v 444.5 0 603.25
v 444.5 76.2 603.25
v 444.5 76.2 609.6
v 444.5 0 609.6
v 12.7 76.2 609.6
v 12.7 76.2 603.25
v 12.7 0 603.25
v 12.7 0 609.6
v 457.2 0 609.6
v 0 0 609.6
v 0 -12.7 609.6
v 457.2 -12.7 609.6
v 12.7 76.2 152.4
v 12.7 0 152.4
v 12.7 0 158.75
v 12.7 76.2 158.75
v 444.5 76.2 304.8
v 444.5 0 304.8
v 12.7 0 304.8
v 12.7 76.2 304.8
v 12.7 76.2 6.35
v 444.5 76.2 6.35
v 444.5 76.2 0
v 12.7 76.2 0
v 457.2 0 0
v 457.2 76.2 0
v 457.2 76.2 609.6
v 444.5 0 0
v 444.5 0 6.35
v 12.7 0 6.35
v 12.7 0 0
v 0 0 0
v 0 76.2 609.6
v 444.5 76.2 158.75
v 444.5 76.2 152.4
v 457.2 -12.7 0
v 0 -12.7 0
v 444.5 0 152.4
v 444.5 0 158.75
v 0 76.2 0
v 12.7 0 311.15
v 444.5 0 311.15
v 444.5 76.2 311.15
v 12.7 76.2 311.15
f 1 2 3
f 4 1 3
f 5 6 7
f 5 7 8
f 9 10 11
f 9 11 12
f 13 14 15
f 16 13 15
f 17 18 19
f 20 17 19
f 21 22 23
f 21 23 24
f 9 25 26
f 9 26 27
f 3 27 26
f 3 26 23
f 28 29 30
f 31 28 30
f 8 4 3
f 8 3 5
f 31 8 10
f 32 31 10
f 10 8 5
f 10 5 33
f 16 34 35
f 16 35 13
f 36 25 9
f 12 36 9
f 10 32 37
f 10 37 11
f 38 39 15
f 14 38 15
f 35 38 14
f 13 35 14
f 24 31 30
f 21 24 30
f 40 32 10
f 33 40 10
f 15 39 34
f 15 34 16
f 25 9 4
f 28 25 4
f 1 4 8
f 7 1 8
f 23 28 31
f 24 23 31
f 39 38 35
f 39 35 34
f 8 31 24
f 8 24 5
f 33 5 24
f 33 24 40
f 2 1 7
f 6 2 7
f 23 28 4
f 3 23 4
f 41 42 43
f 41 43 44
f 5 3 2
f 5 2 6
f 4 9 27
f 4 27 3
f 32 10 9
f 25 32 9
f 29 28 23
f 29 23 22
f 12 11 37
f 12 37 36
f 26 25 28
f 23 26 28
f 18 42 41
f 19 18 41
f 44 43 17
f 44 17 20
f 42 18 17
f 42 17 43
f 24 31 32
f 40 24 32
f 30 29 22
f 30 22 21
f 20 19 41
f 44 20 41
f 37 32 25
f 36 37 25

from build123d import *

# Parameters (mm, degrees)
F0_W     = 457.2
F0_H     = 609.6
F1_DEPTH = 12.7
F2_W     = 12.7
F2_H     = 609.6
F3_DEPTH = 76.2
F4_W     = 431.8
F4_H     = 6.35
F5_DEPTH = 76.2


with BuildPart() as f1:
    # F0 (on Front) → F1 (new body)
    with BuildSketch(Plane.XZ):
        with Locations((228.6, 304.8)):
            Rectangle(F0_W, F0_H)
    extrude(amount=F1_DEPTH)


with BuildPart() as f3:
    # F2 (on face) → F3 (new body)
    with BuildSketch(Plane(origin=(0, 0, 0), x_dir=(-1, 0, 0), z_dir=(0, 1, 0))):
        with Locations((-6.35, 304.8)):
            Rectangle(F2_W, F2_H)
        with Locations((-450.85, 304.8)):
            Rectangle(F2_W, F2_H)
    extrude(amount=F3_DEPTH)


with BuildPart() as f5:
    # F4 (on face) → F5 (new body)
    with BuildSketch(Plane(origin=(0, 0, 0), x_dir=(-1, 0, 0), z_dir=(0, 1, 0))):
        with Locations((-228.6, 3.175)):
            Rectangle(F4_W, F4_H)
        with Locations((-228.6, 606.425)):
            Rectangle(F4_W, F4_H)
        with Locations((-228.6, 155.575)):
            Rectangle(F4_W, F4_H)
        with Locations((-228.6, 307.975)):
            Rectangle(F4_W, F4_H)
    extrude(amount=F5_DEPTH)


solid = Compound([f1.part, f3.part, f5.part])
